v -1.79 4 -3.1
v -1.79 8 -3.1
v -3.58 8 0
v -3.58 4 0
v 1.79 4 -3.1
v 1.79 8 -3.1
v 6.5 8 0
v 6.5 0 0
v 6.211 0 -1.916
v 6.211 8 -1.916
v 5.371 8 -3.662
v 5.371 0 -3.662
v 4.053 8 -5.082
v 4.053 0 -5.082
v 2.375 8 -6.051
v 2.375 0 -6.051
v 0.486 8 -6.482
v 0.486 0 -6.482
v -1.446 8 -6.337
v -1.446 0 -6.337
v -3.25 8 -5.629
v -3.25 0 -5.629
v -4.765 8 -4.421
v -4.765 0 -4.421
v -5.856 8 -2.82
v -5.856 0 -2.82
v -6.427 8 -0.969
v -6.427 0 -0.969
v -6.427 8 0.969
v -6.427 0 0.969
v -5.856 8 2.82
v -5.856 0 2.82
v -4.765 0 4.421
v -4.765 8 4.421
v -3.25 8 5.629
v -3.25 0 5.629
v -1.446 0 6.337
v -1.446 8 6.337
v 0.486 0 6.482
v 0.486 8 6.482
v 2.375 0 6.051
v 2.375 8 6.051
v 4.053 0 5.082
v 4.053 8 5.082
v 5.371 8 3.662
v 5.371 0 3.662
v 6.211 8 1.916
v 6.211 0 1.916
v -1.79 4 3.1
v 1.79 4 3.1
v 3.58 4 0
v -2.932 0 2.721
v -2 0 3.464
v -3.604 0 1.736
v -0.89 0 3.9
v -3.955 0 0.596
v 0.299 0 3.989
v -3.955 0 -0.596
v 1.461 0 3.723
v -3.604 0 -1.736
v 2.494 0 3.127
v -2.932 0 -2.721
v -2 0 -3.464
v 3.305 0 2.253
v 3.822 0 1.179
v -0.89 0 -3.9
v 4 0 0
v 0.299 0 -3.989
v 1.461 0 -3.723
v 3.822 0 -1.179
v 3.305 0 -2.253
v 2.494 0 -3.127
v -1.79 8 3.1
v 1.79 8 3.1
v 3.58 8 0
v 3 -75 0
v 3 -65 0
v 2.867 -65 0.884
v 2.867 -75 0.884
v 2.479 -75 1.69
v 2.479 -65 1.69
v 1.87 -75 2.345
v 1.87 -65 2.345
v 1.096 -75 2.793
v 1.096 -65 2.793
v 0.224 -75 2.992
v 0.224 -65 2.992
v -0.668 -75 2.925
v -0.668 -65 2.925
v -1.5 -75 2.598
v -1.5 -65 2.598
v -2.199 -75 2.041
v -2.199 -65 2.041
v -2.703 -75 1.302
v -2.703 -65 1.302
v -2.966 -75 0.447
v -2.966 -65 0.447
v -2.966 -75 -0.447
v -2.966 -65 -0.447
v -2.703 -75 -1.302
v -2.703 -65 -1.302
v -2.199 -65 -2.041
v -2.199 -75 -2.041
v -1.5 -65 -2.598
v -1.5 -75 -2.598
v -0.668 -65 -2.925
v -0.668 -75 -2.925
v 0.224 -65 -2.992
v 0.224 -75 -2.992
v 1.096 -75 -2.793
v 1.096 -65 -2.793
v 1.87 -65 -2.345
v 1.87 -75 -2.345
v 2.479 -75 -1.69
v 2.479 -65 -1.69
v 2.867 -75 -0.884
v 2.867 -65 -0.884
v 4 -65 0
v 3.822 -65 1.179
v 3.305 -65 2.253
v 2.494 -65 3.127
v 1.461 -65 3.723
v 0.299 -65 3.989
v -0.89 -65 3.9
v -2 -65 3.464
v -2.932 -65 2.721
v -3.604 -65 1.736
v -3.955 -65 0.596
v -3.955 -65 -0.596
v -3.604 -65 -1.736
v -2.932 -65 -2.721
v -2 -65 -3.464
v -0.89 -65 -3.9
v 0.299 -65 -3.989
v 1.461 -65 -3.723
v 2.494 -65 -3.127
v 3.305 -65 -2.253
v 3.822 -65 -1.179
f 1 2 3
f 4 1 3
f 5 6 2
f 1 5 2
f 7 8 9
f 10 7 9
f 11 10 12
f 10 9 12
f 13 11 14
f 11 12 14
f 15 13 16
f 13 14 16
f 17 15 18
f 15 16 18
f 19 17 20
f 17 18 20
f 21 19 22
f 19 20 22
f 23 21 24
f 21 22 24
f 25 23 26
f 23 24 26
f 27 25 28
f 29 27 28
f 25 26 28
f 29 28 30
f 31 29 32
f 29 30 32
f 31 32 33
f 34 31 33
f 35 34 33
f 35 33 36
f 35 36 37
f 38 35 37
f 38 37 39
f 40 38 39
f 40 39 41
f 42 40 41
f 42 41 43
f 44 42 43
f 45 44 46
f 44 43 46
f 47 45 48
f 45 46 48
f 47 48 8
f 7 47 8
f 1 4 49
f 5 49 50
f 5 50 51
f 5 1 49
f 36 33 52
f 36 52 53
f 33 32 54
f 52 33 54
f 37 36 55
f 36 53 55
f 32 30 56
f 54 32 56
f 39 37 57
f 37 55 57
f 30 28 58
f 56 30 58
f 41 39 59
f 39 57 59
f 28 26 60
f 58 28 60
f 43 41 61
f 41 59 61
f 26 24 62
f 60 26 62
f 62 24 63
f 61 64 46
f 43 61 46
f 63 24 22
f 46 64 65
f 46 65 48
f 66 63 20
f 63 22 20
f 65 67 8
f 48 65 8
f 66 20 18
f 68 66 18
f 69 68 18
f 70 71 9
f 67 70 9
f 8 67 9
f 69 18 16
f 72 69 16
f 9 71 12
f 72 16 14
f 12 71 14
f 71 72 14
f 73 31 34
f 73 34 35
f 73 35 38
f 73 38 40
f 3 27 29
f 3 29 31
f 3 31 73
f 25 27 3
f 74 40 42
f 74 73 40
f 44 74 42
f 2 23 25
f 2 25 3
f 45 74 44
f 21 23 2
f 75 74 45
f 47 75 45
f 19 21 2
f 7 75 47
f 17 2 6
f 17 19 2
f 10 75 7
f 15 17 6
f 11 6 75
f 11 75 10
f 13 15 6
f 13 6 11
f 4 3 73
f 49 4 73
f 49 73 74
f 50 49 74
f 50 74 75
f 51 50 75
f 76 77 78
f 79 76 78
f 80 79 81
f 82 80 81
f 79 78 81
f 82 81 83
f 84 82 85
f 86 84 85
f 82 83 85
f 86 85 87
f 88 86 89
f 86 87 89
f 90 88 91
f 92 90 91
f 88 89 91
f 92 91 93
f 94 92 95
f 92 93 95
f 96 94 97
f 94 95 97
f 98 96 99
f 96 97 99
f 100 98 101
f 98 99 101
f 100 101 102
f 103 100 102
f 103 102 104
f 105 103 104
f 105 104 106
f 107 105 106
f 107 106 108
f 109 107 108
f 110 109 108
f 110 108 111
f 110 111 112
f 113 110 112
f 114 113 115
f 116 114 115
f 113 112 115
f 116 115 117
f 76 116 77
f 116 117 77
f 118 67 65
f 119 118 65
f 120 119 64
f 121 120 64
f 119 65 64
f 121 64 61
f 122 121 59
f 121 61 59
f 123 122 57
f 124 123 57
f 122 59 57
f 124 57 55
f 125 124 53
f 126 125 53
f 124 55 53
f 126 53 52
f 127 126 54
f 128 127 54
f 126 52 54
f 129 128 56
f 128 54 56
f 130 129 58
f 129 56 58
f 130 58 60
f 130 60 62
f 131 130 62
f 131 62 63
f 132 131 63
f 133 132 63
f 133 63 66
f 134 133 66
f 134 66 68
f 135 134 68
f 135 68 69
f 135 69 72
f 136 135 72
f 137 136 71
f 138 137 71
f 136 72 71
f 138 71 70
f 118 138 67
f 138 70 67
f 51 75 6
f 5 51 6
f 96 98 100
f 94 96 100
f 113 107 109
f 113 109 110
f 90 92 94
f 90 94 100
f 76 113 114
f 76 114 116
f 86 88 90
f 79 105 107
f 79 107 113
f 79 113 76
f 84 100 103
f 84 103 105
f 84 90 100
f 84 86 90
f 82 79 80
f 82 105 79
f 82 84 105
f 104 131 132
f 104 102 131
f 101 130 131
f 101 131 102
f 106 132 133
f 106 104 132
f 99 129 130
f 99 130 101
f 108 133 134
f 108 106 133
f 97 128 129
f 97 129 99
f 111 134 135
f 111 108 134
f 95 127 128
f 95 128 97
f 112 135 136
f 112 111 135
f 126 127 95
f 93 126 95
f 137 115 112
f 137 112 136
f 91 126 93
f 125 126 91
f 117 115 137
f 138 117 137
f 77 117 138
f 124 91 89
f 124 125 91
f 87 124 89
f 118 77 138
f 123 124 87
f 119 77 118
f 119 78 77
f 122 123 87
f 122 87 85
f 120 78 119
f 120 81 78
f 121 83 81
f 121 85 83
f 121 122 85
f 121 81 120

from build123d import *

# Parameters (mm, degrees)
SKETCH_1_R            = 6.5
EXTRUDE_255_DEPTH     = 8
CUT_EXTRUDE_389_DEPTH = 4
SKETCH_3_R            = 4
EXTRUDE_494_DEPTH     = 65
SKETCH_4_R            = 3
EXTRUDE_M6_DEPTH      = 10


with BuildPart() as part:
    # 草图1 → Extrude 255 (new body)
    with BuildSketch(Plane(origin=(0, 0, 0), x_dir=(1, 0, 0), z_dir=(0, 1, 0))):
        Circle(SKETCH_1_R)
    extrude(amount=EXTRUDE_255_DEPTH)

    # 草图2 → Cut-Extrude 389 (cut)
    with BuildSketch(Plane(origin=(0, 8, 0), x_dir=(1, 0, 0), z_dir=(0, 1, 0))):
        Polygon((3.579571669, 0), (1.789785834, 3.1), (-1.789785834, 3.1), (-3.579571669, 0), (-1.789785834, -3.1), (1.789785834, -3.1), align=None)
    extrude(amount=-CUT_EXTRUDE_389_DEPTH, mode=Mode.SUBTRACT)

    # 草图3 → Extrude 494 (add)
    with BuildSketch(Plane.XZ):
        Circle(SKETCH_3_R)
    extrude(amount=EXTRUDE_494_DEPTH)

    # 草图4 → M6螺纹 (add)
    with BuildSketch(Plane.XZ.offset(65)):
        Circle(SKETCH_4_R)
    extrude(amount=EXTRUDE_M6_DEPTH)


solid = part.part
